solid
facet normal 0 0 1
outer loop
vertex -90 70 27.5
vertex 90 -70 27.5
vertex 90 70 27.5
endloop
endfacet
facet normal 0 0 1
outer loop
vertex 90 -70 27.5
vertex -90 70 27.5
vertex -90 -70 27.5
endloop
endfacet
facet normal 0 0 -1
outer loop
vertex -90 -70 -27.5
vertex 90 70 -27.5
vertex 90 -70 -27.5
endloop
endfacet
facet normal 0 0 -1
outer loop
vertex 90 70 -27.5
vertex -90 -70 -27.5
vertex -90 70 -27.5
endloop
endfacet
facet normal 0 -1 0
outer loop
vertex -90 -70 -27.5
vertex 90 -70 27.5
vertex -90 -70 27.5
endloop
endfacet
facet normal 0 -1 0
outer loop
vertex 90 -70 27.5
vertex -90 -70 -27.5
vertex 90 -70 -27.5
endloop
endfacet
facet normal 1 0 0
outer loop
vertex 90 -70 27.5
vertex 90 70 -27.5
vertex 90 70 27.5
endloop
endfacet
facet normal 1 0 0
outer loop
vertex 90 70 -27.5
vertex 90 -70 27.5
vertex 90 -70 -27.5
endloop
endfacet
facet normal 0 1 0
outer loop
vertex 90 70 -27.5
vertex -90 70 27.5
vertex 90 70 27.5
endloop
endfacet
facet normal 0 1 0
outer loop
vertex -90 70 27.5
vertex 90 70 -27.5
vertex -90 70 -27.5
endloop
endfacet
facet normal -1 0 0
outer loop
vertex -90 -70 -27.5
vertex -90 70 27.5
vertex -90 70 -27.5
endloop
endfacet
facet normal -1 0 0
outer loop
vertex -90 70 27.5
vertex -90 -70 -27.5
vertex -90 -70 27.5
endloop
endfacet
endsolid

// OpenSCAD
// ============================================================================
// Atom Lithography Machine — Parametric OpenSCAD Module (S6.11-02)
// ============================================================================
// part_id           : S6.11-02
// parent_bom_id     : S6.11
// subsystem         : S6
// part_name         : 20 mK Josephson TWPA + Bant-Geciren Purcell Filtre + Cift Kriyo-Izolator (32 hat, Exp140 S6.5-02, 2.72 kg)
// material          : Nb
// temp_stage        : 20 mK (MXC)
// vacuum_grade      : Kriyo-vakum
// tolerance         : F_RO>=0.995
// computed_mass_kg  : 2.85826
// envelope_mm       : 180.000 x 140.000 x 54.800
// design_maturity   : M0_M1_DETAILED_CAD_DESIGN_ONLY
// no_lab_measurement: true
// iec61508_certified: false
// semi_s2_certified : false
// Units: millimeters (mm)
// ============================================================================

$fn = 64;

// Nominal bounding envelope parameters (mm)
bbox_x = 180.0000;
bbox_y = 140.0000;
bbox_z = 54.8000;

// Part-specific parametric dimensions
n_twpa = 32;
box_dx = 180.0;
box_dy = 140.0;
box_dz = 55.0;
p_20mk_uw = 2.144;

// Interface / port parameters (mm)
port_mxc_20mk_mount_bolts = 4;

module part_S6_11_02() {
  union() {
    // 32x 20 mK TWPA + Purcell Nb/Cryoperm magnetic shield box
    cube([180.000, 140.000, 55.000], center=true);
  }
}

// World assembly mounting transform (global machine frame, mm / deg):
// translate([-650.000, 0.000, 452.000]) rotate([0.000, 0.000, 0.000]) part_S6_11_02();

part_S6_11_02();
